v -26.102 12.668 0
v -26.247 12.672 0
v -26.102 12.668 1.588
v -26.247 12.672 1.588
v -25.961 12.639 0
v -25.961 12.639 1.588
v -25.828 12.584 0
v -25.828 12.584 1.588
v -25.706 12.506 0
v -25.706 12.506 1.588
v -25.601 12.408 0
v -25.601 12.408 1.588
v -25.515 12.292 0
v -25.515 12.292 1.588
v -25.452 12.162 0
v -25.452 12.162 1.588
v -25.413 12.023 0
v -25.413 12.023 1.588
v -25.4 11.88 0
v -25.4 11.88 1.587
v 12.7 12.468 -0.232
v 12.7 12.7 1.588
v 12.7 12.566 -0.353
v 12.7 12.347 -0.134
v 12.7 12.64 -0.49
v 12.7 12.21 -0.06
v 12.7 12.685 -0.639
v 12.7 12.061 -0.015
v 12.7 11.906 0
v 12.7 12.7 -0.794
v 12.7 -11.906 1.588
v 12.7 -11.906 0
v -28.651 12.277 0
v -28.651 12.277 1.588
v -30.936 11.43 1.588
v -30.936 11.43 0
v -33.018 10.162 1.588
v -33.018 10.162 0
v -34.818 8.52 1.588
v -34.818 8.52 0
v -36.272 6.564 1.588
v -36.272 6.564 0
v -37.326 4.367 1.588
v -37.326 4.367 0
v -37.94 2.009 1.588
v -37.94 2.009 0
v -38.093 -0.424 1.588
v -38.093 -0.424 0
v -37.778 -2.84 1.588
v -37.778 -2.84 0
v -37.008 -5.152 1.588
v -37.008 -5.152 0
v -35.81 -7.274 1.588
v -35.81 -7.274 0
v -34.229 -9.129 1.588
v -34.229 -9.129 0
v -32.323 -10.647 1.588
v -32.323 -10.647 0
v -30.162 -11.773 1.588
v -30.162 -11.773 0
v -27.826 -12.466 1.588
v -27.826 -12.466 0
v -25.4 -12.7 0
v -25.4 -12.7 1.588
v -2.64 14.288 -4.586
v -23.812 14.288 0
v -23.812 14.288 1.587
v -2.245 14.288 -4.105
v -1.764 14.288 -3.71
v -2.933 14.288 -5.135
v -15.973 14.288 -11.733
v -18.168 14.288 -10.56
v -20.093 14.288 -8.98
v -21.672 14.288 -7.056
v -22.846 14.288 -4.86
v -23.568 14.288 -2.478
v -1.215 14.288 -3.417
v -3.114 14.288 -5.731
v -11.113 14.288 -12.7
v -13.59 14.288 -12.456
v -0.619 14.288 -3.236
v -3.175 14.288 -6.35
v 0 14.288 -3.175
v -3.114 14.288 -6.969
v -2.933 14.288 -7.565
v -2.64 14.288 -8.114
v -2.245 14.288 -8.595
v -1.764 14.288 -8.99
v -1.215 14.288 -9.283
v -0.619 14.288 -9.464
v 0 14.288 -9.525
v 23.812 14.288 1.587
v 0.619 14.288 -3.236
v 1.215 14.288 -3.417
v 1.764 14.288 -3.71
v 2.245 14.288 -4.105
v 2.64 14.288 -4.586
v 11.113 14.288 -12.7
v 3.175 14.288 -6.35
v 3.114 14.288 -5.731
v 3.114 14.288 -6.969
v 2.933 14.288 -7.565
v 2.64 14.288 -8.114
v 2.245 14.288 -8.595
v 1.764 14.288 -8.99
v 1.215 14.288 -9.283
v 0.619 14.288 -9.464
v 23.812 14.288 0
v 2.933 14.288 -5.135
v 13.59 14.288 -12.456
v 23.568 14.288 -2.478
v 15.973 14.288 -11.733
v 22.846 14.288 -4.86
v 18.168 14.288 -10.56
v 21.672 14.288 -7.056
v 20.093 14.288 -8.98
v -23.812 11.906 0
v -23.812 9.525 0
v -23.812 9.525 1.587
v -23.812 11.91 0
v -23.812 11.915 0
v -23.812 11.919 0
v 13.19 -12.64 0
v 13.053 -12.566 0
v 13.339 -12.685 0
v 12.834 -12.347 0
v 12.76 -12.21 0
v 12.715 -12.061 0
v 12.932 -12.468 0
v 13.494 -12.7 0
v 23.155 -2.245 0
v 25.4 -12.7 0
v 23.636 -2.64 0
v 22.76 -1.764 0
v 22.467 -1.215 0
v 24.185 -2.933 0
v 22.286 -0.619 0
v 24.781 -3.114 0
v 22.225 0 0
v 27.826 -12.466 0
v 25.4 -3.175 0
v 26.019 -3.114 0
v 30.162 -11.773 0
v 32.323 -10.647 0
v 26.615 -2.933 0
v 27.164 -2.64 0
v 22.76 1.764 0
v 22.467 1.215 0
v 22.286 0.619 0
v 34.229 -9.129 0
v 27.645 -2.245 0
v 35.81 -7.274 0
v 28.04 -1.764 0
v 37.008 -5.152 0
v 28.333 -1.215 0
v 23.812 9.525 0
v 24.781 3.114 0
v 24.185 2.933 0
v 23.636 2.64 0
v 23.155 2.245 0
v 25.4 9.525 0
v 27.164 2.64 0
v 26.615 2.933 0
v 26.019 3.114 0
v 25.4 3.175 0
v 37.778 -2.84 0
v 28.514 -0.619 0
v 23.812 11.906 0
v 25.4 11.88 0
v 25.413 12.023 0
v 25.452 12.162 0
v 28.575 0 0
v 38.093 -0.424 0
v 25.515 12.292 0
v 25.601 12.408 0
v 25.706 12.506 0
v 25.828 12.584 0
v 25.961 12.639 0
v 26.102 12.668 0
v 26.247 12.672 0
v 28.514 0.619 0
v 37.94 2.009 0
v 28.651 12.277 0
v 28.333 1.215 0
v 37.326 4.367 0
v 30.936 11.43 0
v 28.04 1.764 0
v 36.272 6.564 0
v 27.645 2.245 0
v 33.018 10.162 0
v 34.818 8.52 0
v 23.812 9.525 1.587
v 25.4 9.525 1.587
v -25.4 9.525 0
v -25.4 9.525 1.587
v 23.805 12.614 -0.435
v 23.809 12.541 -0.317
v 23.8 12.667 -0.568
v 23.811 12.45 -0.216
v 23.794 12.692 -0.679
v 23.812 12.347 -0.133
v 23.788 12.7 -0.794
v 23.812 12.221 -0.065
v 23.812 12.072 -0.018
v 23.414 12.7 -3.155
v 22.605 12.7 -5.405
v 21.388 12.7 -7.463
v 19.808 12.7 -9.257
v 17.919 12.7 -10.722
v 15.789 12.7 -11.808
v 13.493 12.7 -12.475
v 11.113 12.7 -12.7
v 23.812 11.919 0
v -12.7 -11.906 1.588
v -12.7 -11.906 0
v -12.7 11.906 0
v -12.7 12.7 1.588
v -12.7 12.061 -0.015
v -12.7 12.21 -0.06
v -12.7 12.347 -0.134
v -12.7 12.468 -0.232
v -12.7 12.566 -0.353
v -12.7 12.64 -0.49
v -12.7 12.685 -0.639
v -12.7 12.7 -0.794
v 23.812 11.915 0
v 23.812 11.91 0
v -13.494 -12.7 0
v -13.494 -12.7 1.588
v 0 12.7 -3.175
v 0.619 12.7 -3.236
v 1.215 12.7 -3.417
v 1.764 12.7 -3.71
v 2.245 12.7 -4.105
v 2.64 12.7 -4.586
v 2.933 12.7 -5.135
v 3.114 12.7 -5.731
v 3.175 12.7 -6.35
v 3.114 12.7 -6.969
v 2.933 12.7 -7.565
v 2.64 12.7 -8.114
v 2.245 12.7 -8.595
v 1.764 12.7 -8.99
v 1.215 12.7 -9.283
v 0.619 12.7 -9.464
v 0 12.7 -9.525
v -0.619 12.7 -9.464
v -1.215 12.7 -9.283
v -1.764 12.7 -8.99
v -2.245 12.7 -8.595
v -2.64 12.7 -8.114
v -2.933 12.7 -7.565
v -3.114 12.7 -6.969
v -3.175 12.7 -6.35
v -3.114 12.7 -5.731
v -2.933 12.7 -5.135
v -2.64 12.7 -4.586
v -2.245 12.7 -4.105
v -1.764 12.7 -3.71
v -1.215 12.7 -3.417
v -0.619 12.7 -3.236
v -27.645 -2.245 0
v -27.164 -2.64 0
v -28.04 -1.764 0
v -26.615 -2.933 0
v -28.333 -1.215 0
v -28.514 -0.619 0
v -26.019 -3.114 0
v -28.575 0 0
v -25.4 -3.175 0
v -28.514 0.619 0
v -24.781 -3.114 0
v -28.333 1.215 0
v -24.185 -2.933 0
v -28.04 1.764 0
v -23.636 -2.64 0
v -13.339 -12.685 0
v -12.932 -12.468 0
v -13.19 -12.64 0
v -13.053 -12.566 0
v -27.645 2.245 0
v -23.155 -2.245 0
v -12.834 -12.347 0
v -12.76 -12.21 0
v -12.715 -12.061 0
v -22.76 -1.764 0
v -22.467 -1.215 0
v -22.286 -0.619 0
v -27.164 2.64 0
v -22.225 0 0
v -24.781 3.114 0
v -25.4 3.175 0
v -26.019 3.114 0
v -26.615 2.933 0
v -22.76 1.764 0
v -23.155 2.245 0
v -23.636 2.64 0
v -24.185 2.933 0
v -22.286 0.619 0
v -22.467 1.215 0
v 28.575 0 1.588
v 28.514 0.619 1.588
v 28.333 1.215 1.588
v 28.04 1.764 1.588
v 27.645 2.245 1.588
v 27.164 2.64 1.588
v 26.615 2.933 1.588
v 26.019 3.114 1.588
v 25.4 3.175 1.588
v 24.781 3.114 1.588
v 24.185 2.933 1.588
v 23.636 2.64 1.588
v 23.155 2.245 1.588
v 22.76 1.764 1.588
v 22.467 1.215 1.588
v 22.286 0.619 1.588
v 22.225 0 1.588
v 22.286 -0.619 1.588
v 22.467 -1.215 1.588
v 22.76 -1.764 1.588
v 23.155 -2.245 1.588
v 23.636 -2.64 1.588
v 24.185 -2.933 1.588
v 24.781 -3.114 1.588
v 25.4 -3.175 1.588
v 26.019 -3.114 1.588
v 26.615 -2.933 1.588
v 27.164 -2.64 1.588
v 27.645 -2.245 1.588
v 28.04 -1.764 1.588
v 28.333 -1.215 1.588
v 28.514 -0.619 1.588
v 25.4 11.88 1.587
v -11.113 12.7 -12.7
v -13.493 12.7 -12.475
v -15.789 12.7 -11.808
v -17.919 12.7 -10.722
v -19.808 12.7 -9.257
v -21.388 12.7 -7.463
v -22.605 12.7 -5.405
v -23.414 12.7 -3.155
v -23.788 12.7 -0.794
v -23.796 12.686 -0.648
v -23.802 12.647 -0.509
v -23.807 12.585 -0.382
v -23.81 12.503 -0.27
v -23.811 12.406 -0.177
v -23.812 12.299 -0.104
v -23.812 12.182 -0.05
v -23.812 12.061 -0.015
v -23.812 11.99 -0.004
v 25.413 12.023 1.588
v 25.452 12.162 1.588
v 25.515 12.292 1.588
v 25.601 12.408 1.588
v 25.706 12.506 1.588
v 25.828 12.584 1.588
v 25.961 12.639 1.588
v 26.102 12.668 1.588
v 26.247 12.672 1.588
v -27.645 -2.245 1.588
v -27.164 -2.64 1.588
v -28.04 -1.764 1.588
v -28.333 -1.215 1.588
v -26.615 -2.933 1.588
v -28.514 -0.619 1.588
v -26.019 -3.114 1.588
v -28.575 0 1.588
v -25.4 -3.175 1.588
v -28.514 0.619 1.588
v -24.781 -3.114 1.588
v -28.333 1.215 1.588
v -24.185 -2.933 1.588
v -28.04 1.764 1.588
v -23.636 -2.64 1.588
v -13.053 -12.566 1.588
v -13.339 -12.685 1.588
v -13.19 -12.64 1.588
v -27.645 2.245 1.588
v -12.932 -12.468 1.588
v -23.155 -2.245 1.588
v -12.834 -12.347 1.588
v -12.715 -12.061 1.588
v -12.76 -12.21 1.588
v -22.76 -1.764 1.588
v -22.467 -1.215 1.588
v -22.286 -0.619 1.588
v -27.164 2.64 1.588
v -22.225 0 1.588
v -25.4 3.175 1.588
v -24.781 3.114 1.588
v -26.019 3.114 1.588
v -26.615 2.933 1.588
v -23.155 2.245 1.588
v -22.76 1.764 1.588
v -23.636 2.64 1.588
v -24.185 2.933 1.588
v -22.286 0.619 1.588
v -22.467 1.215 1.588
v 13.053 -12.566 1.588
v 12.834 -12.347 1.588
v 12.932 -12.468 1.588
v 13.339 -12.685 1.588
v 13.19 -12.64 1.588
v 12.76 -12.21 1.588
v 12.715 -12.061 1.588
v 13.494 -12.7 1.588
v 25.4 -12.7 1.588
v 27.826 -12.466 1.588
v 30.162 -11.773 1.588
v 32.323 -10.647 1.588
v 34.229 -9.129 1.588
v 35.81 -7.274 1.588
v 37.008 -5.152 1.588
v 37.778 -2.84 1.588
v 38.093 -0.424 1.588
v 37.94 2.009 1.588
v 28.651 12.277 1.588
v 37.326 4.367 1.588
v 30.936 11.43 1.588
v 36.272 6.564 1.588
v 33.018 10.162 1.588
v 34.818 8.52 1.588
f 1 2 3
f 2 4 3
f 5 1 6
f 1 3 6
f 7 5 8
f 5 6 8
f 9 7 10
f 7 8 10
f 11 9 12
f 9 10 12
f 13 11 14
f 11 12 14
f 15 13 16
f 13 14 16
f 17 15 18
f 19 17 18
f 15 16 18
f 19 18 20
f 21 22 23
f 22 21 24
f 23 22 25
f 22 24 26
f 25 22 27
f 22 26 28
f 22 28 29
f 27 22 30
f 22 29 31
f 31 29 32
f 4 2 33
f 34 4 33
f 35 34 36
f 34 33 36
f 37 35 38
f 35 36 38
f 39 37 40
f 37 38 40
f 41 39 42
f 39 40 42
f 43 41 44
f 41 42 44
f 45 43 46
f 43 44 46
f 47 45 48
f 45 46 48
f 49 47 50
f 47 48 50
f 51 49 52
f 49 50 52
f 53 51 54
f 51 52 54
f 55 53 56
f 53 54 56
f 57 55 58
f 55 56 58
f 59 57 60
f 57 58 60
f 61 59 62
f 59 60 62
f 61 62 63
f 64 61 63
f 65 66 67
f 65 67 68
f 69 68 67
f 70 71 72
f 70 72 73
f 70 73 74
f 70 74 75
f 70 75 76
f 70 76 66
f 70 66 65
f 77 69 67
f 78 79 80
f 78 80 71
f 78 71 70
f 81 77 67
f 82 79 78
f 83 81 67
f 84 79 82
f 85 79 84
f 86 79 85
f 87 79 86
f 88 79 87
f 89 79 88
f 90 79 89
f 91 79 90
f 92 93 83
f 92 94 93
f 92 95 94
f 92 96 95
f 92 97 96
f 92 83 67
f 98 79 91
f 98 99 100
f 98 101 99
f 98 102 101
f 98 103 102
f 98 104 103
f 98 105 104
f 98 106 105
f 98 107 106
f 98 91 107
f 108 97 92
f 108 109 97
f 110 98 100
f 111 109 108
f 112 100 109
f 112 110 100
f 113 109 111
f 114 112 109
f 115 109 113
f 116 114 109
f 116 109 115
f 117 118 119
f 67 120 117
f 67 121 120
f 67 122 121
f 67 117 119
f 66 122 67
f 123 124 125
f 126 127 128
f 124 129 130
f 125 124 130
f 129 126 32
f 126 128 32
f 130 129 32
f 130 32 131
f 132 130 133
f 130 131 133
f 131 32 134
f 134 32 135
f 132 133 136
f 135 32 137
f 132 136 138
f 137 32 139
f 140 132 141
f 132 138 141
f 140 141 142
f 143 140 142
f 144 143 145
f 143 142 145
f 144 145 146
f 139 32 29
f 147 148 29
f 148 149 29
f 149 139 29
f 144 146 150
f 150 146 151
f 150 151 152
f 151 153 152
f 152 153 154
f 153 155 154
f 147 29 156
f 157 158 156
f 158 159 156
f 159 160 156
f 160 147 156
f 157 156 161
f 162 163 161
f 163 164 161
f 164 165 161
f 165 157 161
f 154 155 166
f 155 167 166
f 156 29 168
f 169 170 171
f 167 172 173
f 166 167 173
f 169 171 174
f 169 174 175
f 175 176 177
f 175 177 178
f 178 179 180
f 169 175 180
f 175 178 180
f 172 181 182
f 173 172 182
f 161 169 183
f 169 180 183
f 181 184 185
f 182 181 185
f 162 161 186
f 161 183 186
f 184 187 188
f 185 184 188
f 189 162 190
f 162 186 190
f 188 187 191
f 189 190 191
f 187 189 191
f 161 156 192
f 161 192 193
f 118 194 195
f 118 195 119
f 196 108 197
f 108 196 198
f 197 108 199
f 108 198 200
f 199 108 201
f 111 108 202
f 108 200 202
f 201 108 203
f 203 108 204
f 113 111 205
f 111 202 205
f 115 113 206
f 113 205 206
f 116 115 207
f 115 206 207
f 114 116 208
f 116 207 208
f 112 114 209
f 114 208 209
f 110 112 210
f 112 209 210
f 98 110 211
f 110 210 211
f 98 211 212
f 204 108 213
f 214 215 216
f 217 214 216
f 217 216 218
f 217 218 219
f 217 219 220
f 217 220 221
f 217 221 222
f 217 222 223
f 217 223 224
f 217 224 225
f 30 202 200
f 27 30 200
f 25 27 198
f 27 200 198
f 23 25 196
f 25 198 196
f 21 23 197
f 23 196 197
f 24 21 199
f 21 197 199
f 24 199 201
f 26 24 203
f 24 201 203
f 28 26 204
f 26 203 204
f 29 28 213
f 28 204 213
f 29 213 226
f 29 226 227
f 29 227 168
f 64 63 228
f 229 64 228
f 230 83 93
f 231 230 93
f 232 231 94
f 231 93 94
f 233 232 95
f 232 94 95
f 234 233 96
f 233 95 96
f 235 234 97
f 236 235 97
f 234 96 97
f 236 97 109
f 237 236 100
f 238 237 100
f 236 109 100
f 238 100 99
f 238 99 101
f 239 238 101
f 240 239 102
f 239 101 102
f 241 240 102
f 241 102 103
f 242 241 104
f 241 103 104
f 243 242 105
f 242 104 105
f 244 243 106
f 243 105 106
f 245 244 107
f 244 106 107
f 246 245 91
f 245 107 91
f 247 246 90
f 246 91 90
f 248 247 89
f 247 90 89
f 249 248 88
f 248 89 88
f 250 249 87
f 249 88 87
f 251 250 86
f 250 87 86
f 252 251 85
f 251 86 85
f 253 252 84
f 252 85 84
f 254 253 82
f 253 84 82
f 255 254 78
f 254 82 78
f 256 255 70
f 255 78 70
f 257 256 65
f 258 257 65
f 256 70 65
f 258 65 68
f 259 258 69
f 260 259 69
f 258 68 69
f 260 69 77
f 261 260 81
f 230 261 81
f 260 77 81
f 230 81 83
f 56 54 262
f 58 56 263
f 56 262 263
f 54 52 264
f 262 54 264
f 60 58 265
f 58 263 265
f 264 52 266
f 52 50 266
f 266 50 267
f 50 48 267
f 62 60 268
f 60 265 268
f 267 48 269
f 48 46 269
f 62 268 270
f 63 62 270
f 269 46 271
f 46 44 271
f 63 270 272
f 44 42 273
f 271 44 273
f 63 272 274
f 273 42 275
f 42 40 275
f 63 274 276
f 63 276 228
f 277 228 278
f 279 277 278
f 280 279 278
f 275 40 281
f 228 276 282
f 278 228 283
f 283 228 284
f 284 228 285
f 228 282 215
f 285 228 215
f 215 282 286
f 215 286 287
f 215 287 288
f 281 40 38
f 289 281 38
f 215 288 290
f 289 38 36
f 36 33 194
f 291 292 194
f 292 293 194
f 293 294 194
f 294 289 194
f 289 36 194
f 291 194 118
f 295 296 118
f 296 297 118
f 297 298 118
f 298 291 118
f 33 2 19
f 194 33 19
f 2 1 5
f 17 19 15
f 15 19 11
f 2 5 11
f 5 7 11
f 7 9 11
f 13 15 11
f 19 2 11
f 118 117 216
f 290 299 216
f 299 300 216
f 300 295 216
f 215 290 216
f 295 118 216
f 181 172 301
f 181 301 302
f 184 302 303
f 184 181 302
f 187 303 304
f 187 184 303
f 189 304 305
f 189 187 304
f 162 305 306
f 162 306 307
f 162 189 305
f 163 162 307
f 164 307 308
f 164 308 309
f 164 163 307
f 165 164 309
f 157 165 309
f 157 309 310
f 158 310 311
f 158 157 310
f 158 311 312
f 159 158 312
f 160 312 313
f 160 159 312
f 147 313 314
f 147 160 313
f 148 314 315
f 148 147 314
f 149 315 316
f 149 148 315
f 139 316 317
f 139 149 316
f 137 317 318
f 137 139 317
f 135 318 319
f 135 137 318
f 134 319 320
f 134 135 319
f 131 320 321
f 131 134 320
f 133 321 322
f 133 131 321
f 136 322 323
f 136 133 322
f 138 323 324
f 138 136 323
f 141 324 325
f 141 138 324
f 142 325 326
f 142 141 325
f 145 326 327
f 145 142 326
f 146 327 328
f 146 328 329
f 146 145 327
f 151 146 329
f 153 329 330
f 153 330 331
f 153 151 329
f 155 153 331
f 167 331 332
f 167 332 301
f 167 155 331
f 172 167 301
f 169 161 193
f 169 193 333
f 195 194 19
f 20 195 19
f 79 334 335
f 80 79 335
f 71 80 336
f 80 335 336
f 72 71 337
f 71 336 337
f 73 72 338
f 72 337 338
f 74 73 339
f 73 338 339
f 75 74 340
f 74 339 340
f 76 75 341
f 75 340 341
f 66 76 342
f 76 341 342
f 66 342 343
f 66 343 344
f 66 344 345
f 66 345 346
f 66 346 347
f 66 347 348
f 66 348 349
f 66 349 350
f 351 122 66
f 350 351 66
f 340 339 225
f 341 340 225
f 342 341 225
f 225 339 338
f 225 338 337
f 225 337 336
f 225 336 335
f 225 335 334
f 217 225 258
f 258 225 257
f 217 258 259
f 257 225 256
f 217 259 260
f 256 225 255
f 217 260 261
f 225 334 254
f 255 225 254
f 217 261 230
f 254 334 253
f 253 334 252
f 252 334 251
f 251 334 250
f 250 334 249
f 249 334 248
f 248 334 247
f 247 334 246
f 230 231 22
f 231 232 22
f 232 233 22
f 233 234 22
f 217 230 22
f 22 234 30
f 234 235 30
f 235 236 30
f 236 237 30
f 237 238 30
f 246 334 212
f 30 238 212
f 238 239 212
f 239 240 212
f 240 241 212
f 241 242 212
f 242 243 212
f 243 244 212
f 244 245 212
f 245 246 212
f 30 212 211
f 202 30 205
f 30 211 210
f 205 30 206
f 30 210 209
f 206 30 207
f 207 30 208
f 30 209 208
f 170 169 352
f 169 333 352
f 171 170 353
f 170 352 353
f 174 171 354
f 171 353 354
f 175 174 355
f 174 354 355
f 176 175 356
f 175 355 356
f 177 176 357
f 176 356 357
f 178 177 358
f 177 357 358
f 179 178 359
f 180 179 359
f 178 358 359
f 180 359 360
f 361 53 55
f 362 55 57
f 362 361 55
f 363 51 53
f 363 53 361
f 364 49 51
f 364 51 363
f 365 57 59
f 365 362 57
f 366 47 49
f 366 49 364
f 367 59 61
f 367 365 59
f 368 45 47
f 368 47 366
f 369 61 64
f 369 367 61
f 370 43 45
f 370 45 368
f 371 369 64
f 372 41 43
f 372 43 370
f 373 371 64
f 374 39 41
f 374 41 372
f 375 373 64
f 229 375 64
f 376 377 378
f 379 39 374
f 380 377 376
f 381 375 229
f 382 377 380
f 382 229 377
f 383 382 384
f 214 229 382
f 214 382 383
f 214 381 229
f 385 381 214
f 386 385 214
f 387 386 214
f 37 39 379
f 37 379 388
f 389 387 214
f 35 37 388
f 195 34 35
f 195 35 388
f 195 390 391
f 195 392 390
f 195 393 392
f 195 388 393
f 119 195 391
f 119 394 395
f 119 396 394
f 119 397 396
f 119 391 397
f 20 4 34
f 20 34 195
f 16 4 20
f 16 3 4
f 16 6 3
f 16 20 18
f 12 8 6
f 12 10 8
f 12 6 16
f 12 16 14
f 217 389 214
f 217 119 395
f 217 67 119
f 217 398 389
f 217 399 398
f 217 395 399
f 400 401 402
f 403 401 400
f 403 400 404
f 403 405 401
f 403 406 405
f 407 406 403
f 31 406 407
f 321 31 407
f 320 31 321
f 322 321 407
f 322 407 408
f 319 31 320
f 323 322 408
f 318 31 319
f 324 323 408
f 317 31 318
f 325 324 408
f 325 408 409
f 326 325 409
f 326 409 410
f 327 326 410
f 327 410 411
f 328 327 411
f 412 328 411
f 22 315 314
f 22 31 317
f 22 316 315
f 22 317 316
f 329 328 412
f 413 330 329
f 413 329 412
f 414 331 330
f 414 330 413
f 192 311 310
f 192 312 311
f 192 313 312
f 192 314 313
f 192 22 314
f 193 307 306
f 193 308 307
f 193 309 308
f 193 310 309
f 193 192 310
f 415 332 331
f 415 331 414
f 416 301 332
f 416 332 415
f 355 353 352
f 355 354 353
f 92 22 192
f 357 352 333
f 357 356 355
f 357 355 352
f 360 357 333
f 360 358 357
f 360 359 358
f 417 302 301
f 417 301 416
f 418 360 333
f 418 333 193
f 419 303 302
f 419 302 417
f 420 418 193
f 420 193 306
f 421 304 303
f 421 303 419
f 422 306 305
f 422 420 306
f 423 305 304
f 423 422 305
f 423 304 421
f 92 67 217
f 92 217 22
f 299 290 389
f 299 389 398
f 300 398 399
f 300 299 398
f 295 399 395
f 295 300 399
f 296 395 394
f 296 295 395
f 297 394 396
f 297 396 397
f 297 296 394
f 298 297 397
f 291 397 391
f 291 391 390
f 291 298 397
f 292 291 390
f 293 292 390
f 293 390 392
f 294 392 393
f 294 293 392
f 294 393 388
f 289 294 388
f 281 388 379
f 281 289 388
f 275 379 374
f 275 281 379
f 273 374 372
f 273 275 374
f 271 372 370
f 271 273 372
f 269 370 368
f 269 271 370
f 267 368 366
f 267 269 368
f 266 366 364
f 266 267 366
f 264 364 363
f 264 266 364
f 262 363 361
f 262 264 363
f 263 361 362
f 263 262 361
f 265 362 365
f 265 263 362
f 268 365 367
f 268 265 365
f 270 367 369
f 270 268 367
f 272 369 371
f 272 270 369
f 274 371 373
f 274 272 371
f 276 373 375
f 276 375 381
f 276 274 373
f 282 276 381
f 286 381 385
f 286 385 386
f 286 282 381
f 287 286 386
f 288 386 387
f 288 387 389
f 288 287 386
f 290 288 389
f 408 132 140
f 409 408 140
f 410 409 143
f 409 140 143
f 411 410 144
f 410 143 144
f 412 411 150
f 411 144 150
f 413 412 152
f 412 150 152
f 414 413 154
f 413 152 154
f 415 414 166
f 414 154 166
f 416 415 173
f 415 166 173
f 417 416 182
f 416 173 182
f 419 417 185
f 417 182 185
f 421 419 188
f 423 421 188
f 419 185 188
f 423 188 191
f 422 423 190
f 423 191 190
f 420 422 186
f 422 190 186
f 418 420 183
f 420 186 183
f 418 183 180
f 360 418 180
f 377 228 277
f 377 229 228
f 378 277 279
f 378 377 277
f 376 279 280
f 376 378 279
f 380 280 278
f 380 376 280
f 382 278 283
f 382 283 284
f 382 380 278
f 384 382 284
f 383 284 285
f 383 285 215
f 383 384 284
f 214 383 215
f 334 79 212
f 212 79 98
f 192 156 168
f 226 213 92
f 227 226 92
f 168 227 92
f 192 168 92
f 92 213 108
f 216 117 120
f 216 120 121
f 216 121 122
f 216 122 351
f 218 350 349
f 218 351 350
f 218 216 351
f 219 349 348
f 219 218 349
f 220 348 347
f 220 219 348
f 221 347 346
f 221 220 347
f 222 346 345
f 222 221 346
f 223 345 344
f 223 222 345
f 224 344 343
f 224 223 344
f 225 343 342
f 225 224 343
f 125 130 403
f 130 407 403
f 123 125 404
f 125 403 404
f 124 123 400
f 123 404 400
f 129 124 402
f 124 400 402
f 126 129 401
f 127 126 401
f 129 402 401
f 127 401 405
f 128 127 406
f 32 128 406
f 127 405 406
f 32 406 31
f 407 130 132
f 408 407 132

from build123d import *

# Parameters (mm, degrees)
SKETCH1_R               = 3.175
BOSS_EXTRUDE1_DEPTH     = 1.5875
SKETCH3_W               = 50.8
SKETCH3_H               = 12.7
SKETCH3_R               = 3.175
BOSS_EXTRUDE2_DEPTH     = 1.5875
CUT_EXTRUDE1_DEPTH      = 44.12627172
CUT_EXTRUDE1_DEPTH_BACK = 44.12627172
SKETCH5_W               = 1.5875
SKETCH5_H               = 4.7625
FILLET2_R               = 0.79375
FILLET3_R               = 12.7


with BuildPart() as part:
    # Sketch1 → Boss-Extrude1 (new body)
    with BuildSketch(Plane.XY):
        with BuildLine():
            Line((-25.4, -12.7), (-12.7, -12.7))
            Line((-12.7, -12.7), (-12.7, 12.7))
            Line((-12.7, 12.7), (12.7, 12.7))
            Line((12.7, 12.7), (12.7, -12.7))
            Line((12.7, -12.7), (25.4, -12.7))
            ThreePointArc((25.4, -12.7), (38.1, 0), (25.4, 12.7))
            Line((25.4, 12.7), (25.4, 14.2875))
            Line((25.4, 14.2875), (-25.4, 14.2875))
            Line((-25.4, 14.2875), (-25.4, 12.7))
            ThreePointArc((-25.4, 12.7), (-38.1, 0), (-25.4, -12.7))
        make_face()
        with Locations((-25.4, 0)):
            Circle(SKETCH1_R, mode=Mode.SUBTRACT)
        with Locations((25.4, 0)):
            Circle(SKETCH1_R, mode=Mode.SUBTRACT)
    extrude(amount=BOSS_EXTRUDE1_DEPTH)

    # Sketch3 → Boss-Extrude2 (add)
    with BuildSketch(Plane(origin=(0, 14.2875, 0), x_dir=(1, 0, 0), z_dir=(0, 1, 0))):
        with Locations((0, 6.35)):
            Rectangle(SKETCH3_W, SKETCH3_H)
        with Locations(Location((0, 6.35, 0), (0, 0, 270))):
            Circle(SKETCH3_R, mode=Mode.SUBTRACT)
    extrude(amount=-BOSS_EXTRUDE2_DEPTH)

    # Sketch5 → Cut-Extrude1 (cut, two sides: drawn at the far end of the back side and taken through both)
    with BuildSketch(Plane.XY.offset(1.5875).offset(-CUT_EXTRUDE1_DEPTH_BACK)):
        with Locations((-24.60625, 11.90625)):
            Rectangle(SKETCH5_W, SKETCH5_H)
        with Locations((24.60625, 11.90625)):
            Rectangle(SKETCH5_W, SKETCH5_H)
    extrude(amount=CUT_EXTRUDE1_DEPTH + CUT_EXTRUDE1_DEPTH_BACK, mode=Mode.SUBTRACT)

    # Fillet2
    fillet2_edges = [part.edges().sort_by_distance(p)[0] for p in [
        (-12.7, -12.7, 0.79375),
        (-25.4, 12.7, 0.79375),
        (25.4, 12.7, 0.79375),
        (12.7, -12.7, 0.79375),
        (18.25625, 12.7, 0),
        (-18.25625, 12.7, 0),
    ]]
    fillet(fillet2_edges, radius=FILLET2_R)

    # Fillet3
    fillet3_edges = [part.edges().sort_by_distance(p)[0] for p in [
        (23.8125, 13.49375, -12.7),
        (-23.8125, 13.49375, -12.7),
    ]]
    fillet(fillet3_edges, radius=FILLET3_R - 0.0001)  # a hair under: the kernel refuses the full size


solid = part.part
